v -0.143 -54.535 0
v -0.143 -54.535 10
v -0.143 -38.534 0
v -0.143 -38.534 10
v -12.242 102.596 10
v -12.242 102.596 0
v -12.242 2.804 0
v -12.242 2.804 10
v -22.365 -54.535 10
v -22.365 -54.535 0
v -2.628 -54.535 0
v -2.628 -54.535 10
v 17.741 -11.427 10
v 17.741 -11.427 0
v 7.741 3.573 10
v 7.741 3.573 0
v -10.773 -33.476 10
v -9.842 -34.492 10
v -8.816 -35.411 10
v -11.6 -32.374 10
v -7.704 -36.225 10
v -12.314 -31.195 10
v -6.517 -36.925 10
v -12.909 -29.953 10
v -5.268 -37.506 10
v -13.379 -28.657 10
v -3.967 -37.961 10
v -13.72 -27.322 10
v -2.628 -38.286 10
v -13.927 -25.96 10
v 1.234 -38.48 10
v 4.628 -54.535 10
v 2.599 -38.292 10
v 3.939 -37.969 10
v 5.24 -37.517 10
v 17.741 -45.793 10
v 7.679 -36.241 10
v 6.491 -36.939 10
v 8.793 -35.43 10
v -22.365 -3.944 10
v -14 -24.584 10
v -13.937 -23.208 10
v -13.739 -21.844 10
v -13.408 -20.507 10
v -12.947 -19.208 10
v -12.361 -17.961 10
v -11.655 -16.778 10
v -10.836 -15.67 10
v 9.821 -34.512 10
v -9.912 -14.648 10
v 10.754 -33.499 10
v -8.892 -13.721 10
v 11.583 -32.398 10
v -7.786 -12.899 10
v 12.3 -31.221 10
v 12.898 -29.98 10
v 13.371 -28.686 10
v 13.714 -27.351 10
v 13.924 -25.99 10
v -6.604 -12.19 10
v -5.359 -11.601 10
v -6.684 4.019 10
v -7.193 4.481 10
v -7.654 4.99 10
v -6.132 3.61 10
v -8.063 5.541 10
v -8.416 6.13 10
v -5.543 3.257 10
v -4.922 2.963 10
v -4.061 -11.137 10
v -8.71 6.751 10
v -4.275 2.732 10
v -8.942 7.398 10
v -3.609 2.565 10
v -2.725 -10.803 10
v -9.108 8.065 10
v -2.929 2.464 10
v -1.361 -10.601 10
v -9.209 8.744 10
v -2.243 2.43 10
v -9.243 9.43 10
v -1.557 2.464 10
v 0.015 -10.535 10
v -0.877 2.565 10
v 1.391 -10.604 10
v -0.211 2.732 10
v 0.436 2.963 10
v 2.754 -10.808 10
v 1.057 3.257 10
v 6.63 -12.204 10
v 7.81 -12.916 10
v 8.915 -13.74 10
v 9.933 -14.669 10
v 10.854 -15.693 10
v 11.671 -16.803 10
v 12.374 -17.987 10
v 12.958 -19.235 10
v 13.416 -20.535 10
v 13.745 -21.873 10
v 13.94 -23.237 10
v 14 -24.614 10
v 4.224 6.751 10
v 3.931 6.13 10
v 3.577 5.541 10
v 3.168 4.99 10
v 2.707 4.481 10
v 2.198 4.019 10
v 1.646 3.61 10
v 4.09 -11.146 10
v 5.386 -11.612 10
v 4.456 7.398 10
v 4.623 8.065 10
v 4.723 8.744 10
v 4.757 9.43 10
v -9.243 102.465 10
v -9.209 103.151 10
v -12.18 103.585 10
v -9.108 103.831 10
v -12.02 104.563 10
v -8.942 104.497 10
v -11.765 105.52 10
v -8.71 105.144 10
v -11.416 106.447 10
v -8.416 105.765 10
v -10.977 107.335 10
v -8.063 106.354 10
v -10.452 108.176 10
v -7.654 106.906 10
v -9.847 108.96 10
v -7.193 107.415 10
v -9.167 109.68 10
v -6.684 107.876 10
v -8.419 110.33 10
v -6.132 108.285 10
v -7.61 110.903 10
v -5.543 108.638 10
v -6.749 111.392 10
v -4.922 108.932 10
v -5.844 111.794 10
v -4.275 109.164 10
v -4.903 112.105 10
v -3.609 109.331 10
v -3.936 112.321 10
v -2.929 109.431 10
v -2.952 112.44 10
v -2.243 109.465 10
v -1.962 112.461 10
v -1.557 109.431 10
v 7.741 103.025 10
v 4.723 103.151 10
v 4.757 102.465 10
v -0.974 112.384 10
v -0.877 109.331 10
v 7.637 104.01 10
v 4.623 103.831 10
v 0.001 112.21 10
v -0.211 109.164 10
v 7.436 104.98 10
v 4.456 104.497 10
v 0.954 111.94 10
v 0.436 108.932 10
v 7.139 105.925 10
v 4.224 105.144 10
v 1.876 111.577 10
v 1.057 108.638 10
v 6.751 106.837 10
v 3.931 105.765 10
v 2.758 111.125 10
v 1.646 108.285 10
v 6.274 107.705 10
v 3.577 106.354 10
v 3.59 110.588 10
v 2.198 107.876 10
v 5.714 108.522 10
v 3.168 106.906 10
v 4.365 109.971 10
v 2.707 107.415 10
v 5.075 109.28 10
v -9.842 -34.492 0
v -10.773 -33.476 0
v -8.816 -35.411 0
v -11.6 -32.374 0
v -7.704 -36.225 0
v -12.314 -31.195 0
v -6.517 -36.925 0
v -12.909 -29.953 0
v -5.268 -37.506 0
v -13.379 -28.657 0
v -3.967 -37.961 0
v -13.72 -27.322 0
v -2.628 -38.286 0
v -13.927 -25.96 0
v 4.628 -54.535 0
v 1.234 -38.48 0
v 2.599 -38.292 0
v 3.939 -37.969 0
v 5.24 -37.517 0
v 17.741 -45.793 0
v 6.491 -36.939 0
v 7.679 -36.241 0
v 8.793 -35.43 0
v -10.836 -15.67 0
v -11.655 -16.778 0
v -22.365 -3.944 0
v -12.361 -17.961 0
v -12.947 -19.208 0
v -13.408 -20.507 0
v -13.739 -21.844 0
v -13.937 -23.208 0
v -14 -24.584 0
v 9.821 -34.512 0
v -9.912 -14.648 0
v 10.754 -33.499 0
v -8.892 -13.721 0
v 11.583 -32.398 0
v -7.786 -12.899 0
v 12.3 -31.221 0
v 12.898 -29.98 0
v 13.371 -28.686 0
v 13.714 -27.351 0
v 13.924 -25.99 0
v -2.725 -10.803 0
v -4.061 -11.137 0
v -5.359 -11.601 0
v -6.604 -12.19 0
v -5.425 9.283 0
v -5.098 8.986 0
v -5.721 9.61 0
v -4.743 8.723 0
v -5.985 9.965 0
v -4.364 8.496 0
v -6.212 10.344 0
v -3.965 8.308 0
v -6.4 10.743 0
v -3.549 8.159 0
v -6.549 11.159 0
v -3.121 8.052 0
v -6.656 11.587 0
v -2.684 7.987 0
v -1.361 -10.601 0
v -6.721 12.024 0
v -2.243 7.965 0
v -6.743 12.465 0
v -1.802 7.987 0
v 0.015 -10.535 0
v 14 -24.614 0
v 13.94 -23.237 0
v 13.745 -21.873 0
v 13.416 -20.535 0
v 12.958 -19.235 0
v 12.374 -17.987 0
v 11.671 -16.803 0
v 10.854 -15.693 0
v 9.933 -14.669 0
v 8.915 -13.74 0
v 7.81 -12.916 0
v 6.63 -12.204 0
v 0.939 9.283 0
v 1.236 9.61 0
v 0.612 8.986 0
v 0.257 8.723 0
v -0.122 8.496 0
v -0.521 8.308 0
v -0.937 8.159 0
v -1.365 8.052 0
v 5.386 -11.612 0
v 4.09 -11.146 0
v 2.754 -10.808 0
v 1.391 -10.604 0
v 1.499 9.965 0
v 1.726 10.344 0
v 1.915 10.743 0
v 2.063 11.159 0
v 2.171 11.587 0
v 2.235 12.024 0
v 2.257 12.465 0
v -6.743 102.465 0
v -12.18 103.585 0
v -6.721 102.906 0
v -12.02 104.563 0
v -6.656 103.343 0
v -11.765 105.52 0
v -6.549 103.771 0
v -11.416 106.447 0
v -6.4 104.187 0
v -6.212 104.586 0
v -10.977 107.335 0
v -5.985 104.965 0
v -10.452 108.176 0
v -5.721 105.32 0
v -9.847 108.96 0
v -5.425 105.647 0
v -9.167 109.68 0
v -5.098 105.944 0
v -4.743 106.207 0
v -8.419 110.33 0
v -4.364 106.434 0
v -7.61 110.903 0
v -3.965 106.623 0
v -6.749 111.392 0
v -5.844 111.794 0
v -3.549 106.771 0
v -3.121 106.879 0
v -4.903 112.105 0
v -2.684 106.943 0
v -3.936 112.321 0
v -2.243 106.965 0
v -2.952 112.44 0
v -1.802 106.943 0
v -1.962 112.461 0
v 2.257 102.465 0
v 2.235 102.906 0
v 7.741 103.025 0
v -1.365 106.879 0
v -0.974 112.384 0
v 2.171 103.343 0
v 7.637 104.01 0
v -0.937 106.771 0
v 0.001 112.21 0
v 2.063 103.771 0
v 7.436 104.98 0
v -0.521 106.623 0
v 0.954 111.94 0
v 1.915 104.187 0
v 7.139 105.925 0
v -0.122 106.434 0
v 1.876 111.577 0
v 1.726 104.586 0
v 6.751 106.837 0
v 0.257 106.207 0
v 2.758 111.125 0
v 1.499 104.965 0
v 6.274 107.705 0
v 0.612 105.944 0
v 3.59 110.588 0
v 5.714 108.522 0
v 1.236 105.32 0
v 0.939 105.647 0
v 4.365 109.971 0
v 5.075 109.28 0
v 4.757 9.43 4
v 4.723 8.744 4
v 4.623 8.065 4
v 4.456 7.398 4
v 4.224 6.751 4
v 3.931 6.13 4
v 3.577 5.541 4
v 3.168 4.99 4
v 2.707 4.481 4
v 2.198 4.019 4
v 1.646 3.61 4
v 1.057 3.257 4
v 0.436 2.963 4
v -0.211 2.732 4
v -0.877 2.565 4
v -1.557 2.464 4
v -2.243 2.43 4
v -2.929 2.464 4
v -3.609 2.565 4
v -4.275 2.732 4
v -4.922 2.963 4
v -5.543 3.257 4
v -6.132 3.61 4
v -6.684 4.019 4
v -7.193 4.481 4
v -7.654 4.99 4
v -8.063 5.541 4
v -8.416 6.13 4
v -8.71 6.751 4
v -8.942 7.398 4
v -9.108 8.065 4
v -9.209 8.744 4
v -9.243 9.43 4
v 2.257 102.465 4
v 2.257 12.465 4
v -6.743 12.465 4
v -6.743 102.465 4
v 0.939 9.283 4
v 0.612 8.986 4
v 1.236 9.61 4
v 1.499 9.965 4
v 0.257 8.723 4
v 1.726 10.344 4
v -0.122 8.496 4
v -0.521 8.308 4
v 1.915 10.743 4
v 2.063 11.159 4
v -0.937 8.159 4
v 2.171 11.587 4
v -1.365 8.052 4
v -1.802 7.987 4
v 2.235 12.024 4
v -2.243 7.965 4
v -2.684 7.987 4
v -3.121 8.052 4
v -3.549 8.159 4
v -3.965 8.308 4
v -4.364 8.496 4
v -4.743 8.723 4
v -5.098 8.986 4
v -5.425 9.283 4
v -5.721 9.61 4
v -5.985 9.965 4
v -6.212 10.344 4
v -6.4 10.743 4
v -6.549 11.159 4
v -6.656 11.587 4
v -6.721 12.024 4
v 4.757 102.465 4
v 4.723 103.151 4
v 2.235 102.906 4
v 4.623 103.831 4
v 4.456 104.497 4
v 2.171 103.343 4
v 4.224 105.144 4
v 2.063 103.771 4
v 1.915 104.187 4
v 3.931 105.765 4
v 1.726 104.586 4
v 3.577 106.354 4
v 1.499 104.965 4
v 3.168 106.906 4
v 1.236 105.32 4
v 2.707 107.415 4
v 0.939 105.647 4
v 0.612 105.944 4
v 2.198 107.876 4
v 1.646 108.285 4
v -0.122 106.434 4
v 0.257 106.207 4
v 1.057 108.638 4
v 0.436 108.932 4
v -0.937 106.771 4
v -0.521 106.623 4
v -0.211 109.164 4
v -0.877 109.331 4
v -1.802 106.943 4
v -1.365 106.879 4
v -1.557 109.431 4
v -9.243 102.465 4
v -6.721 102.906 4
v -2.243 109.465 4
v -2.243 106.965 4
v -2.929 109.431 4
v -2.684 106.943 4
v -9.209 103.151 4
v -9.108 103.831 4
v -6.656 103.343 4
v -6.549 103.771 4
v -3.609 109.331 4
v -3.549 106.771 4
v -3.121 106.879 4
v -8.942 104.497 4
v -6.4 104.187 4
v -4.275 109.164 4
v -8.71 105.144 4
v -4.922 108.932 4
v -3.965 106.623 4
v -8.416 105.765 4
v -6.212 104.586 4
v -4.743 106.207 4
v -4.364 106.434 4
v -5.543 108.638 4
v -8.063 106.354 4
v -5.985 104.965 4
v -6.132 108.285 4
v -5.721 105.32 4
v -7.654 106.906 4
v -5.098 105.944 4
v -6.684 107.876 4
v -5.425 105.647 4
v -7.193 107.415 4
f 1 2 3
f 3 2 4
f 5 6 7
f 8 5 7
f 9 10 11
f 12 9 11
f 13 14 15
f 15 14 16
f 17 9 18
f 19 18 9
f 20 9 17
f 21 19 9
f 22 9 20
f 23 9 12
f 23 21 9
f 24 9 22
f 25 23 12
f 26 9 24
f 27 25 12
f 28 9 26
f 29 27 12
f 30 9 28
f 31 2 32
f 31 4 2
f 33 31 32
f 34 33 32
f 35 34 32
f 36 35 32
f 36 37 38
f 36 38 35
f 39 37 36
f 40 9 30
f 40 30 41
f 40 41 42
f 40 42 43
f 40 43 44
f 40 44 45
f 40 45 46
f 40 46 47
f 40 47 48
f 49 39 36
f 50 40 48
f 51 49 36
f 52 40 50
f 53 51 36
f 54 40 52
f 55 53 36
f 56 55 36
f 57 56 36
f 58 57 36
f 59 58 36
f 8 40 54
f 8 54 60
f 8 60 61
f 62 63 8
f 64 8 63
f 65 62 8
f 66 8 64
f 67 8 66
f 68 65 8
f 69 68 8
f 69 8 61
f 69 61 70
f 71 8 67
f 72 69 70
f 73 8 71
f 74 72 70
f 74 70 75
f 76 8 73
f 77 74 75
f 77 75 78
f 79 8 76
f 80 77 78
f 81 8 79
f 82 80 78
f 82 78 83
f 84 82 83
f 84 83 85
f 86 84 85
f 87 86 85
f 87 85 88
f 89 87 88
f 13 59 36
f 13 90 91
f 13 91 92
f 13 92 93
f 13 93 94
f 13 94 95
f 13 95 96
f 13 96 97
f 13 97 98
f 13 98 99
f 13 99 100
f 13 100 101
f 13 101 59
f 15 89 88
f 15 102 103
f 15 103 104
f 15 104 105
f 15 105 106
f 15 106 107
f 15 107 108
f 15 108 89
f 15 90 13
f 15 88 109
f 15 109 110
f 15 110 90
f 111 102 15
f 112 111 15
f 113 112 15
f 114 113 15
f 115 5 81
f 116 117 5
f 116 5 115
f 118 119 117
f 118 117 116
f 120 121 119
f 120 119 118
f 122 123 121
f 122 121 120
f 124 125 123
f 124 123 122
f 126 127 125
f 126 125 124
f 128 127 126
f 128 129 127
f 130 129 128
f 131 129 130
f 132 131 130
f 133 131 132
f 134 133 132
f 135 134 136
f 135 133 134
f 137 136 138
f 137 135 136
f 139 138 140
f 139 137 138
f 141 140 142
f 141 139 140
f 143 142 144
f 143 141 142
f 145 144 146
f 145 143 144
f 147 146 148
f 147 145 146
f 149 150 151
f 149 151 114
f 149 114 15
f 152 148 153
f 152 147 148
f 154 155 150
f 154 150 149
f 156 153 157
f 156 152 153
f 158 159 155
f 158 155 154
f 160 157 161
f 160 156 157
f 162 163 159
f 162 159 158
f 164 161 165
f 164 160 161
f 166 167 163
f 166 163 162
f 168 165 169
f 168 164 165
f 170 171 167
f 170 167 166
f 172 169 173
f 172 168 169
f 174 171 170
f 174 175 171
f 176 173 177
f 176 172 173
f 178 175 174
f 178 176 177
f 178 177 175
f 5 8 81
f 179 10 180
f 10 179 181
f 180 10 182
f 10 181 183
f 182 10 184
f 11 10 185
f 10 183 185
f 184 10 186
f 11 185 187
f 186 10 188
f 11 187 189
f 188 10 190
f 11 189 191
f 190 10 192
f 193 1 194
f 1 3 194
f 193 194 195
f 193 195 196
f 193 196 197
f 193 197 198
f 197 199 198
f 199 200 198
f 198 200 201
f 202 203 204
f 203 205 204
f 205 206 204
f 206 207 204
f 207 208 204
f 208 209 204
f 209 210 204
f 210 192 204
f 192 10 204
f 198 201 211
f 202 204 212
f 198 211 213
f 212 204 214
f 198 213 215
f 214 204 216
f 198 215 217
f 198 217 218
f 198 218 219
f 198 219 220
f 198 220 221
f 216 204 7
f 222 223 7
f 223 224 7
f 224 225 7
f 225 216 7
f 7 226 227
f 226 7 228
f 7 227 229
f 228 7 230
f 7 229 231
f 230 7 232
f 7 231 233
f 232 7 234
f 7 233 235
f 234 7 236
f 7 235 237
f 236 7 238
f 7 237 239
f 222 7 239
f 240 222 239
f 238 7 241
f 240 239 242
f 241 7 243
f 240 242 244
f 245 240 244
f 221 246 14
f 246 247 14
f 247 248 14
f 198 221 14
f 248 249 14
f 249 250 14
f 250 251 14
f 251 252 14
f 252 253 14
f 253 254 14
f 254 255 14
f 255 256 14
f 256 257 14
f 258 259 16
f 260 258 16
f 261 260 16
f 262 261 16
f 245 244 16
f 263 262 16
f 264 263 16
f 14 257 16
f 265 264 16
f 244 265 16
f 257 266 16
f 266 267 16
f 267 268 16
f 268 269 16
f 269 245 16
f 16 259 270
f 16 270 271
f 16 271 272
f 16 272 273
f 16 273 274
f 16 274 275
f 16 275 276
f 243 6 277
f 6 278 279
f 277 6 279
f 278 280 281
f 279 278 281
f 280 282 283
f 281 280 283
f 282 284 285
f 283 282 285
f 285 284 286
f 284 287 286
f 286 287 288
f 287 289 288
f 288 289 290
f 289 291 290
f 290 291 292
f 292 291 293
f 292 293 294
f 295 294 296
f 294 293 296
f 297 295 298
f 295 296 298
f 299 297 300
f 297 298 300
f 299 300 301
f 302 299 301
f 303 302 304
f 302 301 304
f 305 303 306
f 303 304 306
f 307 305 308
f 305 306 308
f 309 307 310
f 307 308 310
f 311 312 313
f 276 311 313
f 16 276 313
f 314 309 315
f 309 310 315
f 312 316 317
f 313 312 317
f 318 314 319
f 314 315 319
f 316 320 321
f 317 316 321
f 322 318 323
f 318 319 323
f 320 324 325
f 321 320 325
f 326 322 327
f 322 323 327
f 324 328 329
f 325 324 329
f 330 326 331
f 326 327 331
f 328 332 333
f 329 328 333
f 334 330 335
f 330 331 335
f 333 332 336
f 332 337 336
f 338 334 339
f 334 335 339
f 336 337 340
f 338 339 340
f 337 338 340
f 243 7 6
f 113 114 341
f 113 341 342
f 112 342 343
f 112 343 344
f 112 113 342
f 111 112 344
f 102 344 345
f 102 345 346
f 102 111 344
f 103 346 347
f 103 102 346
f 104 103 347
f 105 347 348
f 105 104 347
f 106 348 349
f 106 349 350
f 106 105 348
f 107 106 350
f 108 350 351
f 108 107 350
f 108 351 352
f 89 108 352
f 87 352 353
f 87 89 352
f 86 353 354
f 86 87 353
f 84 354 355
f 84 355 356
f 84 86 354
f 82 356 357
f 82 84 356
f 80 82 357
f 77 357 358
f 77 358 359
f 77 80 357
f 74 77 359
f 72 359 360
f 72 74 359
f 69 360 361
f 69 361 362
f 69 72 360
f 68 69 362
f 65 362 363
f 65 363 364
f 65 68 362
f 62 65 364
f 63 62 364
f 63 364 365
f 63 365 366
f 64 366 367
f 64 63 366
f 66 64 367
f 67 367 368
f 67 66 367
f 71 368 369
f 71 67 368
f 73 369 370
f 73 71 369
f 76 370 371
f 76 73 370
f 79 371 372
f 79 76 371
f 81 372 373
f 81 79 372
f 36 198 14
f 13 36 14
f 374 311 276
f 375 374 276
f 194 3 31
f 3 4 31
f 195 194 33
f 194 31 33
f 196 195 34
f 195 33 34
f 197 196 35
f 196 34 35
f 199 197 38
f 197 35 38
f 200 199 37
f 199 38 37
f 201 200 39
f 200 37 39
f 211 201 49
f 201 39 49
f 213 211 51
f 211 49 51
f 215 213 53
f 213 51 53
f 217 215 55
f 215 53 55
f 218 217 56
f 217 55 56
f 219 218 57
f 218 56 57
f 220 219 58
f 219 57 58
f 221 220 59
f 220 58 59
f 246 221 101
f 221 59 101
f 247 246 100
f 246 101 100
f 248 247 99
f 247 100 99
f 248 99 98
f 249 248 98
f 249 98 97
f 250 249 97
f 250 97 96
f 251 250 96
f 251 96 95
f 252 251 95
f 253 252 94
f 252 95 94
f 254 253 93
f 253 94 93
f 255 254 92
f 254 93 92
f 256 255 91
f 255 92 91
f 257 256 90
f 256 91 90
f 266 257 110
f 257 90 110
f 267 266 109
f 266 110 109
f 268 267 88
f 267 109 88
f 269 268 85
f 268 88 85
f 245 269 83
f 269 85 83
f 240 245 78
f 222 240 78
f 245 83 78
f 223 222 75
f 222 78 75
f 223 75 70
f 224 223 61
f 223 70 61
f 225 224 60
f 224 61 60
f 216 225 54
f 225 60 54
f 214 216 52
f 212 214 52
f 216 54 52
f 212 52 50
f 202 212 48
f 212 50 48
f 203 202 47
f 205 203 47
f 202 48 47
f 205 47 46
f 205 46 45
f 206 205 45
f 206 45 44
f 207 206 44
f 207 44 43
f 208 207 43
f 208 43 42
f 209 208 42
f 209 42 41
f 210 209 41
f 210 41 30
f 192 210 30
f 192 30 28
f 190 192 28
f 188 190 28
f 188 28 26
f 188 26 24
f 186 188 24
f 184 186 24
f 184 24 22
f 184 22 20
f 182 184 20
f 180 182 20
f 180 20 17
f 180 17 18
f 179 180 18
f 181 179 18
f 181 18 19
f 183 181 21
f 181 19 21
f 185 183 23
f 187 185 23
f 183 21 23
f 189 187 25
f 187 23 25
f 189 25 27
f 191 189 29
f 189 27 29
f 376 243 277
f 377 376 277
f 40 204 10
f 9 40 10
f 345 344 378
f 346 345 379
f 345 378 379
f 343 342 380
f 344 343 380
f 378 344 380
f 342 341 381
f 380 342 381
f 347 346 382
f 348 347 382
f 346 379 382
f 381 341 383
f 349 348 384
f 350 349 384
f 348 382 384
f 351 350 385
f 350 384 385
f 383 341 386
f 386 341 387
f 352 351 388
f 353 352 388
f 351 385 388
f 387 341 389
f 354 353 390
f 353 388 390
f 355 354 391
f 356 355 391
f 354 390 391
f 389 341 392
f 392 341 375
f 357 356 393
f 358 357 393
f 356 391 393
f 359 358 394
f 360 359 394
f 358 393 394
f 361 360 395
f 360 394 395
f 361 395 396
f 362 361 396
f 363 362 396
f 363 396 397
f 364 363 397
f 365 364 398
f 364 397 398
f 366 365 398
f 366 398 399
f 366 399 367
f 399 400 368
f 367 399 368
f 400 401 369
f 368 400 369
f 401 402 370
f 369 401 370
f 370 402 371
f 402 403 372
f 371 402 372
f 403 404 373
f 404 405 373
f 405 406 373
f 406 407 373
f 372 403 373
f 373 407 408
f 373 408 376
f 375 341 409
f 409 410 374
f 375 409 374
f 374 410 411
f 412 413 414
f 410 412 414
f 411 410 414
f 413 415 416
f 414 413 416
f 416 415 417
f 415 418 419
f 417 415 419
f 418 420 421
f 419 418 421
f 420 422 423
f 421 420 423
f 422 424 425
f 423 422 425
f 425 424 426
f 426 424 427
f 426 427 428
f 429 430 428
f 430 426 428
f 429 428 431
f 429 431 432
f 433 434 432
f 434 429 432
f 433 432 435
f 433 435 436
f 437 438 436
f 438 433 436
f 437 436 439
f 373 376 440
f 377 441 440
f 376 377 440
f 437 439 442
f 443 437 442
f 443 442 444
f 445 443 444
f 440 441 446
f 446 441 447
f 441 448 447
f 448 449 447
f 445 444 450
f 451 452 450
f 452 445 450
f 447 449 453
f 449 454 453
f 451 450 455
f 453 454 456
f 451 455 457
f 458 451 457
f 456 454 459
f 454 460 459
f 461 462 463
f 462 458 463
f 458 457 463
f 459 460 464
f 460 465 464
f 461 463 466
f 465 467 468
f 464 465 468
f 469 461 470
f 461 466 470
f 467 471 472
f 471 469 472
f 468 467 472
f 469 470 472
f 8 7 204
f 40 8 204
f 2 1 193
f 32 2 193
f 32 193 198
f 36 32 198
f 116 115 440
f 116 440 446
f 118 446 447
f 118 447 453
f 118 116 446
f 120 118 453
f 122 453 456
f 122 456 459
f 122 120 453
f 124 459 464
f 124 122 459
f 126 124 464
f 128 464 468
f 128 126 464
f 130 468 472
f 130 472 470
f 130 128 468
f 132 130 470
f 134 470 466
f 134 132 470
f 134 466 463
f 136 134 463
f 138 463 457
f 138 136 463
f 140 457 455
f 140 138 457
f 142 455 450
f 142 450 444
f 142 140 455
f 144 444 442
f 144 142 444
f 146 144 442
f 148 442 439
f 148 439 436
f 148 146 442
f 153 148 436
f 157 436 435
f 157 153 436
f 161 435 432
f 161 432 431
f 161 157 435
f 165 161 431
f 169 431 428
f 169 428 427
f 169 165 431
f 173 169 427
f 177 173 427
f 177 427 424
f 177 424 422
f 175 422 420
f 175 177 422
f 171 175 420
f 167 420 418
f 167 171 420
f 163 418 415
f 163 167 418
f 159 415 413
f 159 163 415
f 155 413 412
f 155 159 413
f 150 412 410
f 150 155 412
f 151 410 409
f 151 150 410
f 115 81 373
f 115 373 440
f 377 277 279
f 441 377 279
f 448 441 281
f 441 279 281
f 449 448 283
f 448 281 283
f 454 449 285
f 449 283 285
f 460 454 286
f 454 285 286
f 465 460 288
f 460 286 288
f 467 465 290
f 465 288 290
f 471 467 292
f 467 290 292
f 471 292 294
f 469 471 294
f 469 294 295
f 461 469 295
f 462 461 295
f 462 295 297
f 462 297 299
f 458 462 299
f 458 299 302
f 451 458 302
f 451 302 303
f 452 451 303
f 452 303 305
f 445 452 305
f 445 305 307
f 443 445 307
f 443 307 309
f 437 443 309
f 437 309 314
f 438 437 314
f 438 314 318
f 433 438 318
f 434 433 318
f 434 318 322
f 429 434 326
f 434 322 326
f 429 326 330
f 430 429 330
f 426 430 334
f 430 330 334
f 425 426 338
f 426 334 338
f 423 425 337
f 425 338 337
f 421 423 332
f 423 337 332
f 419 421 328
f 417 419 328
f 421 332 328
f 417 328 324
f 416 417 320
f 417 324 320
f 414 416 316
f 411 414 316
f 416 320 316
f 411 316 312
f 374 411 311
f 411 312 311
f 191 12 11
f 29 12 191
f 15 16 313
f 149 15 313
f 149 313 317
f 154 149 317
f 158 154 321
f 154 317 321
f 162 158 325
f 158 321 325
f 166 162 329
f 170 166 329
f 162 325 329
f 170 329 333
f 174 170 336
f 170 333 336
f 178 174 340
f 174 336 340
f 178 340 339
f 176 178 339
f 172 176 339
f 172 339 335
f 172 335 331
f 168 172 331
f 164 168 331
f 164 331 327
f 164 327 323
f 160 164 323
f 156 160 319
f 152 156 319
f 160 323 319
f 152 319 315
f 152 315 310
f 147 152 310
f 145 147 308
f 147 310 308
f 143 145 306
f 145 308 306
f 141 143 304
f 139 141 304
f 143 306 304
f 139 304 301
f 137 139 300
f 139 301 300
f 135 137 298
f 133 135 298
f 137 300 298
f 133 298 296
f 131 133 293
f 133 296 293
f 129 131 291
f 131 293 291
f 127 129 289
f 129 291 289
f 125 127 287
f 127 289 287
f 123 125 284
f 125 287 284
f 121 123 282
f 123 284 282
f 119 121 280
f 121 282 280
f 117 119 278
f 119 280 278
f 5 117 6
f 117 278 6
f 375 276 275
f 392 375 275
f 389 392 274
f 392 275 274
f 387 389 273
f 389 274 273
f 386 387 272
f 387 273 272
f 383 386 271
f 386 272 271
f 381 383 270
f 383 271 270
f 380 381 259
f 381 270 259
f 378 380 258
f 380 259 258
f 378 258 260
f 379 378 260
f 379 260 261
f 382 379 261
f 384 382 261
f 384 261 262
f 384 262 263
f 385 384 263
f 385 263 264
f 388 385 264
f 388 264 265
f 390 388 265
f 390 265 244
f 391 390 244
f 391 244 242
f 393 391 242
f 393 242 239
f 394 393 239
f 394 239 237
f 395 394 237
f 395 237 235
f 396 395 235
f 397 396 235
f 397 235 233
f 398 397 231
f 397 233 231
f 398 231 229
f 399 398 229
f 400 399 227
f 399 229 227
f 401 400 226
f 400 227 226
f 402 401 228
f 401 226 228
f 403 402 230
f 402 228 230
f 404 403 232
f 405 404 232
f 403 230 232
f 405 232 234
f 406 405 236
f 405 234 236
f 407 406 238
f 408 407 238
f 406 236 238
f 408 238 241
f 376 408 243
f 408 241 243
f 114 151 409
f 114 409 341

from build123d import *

# Parameters (mm, degrees)
BOSS_EXTRUDE1_DEPTH = 10
CUT_EXTRUDE1_DEPTH  = 6
SKETCH3_R           = 14
CUT_EXTRUDE2_DEPTH  = 100
SKETCH4_W           = 2.485456217
SKETCH4_H           = 52.416620737
CUT_EXTRUDE3_DEPTH  = 100


with BuildPart() as part:
    # Sketch1 → Boss-Extrude1 (new body)
    with BuildSketch(Plane.XY):
        with BuildLine():
            Line((-3.679977182, -54.534954407), (4.628170727, -54.534954407))
            Line((4.628170727, -54.534954407), (17.741392821, -45.792806344))
            Line((17.741392821, -45.792806344), (17.741392821, -11.427332251))
            Line((17.741392821, -11.427332251), (7.741392821, 3.572667749))
            Line((7.741392821, 3.572667749), (7.741392821, 103.024920211))
            ThreePointArc((7.741392821, 103.024920211), (-2.457335357, 112.462746672), (-12.242059824, 102.596349566))
            Line((-12.242059824, 102.596349566), (-12.242059824, 2.804284439))
            Line((-12.242059824, 2.804284439), (-22.364938744, -3.944301507))
            Line((-22.364938744, -3.944301507), (-22.364938744, -54.534954407))
            Line((-22.364938744, -54.534954407), (-3.679977182, -54.534954407))
        make_face()
        with BuildLine():
            Line((2.257078102, 102.465045593), (2.257078102, 12.465045593))
            ThreePointArc((2.257078102, 12.465045593), (-2.242921898, 7.965045593), (-6.742921898, 12.465045593))
            Line((-6.742921898, 12.465045593), (-6.742921898, 102.465045593))
            ThreePointArc((-6.742921898, 102.465045593), (-2.242921898, 106.965045593), (2.257078102, 102.465045593))
        make_face(mode=Mode.SUBTRACT)
    extrude(amount=BOSS_EXTRUDE1_DEPTH)

    # Sketch2 → Cut-Extrude1 (cut)
    with BuildSketch(Plane.XY.offset(10)):
        with BuildLine():
            Line((4.757078102, 102.465045593), (4.757078102, 9.430262407))
            ThreePointArc((4.757078102, 9.430262407), (-2.242921898, 2.430262407), (-9.242921898, 9.430262407))
            Line((-9.242921898, 9.430262407), (-9.242921898, 102.465045593))
            ThreePointArc((-9.242921898, 102.465045593), (-2.242921898, 109.465045593), (4.757078102, 102.465045593))
        make_face()
    extrude(amount=-CUT_EXTRUDE1_DEPTH, mode=Mode.SUBTRACT)

    # Sketch3 → Cut-Extrude2 (cut)
    with BuildSketch(Plane.XY.offset(10)):
        with Locations((0, -24.534954407)):
            Circle(SKETCH3_R)
    extrude(amount=-CUT_EXTRUDE2_DEPTH, mode=Mode.SUBTRACT)

    # Sketch4 → Cut-Extrude3 (cut)
    with BuildSketch(Plane.XY.offset(10)):
        with Locations((-1.385400928, -52.416791412)):
            Rectangle(SKETCH4_W, SKETCH4_H)
    extrude(amount=-CUT_EXTRUDE3_DEPTH, mode=Mode.SUBTRACT)


solid = part.part
